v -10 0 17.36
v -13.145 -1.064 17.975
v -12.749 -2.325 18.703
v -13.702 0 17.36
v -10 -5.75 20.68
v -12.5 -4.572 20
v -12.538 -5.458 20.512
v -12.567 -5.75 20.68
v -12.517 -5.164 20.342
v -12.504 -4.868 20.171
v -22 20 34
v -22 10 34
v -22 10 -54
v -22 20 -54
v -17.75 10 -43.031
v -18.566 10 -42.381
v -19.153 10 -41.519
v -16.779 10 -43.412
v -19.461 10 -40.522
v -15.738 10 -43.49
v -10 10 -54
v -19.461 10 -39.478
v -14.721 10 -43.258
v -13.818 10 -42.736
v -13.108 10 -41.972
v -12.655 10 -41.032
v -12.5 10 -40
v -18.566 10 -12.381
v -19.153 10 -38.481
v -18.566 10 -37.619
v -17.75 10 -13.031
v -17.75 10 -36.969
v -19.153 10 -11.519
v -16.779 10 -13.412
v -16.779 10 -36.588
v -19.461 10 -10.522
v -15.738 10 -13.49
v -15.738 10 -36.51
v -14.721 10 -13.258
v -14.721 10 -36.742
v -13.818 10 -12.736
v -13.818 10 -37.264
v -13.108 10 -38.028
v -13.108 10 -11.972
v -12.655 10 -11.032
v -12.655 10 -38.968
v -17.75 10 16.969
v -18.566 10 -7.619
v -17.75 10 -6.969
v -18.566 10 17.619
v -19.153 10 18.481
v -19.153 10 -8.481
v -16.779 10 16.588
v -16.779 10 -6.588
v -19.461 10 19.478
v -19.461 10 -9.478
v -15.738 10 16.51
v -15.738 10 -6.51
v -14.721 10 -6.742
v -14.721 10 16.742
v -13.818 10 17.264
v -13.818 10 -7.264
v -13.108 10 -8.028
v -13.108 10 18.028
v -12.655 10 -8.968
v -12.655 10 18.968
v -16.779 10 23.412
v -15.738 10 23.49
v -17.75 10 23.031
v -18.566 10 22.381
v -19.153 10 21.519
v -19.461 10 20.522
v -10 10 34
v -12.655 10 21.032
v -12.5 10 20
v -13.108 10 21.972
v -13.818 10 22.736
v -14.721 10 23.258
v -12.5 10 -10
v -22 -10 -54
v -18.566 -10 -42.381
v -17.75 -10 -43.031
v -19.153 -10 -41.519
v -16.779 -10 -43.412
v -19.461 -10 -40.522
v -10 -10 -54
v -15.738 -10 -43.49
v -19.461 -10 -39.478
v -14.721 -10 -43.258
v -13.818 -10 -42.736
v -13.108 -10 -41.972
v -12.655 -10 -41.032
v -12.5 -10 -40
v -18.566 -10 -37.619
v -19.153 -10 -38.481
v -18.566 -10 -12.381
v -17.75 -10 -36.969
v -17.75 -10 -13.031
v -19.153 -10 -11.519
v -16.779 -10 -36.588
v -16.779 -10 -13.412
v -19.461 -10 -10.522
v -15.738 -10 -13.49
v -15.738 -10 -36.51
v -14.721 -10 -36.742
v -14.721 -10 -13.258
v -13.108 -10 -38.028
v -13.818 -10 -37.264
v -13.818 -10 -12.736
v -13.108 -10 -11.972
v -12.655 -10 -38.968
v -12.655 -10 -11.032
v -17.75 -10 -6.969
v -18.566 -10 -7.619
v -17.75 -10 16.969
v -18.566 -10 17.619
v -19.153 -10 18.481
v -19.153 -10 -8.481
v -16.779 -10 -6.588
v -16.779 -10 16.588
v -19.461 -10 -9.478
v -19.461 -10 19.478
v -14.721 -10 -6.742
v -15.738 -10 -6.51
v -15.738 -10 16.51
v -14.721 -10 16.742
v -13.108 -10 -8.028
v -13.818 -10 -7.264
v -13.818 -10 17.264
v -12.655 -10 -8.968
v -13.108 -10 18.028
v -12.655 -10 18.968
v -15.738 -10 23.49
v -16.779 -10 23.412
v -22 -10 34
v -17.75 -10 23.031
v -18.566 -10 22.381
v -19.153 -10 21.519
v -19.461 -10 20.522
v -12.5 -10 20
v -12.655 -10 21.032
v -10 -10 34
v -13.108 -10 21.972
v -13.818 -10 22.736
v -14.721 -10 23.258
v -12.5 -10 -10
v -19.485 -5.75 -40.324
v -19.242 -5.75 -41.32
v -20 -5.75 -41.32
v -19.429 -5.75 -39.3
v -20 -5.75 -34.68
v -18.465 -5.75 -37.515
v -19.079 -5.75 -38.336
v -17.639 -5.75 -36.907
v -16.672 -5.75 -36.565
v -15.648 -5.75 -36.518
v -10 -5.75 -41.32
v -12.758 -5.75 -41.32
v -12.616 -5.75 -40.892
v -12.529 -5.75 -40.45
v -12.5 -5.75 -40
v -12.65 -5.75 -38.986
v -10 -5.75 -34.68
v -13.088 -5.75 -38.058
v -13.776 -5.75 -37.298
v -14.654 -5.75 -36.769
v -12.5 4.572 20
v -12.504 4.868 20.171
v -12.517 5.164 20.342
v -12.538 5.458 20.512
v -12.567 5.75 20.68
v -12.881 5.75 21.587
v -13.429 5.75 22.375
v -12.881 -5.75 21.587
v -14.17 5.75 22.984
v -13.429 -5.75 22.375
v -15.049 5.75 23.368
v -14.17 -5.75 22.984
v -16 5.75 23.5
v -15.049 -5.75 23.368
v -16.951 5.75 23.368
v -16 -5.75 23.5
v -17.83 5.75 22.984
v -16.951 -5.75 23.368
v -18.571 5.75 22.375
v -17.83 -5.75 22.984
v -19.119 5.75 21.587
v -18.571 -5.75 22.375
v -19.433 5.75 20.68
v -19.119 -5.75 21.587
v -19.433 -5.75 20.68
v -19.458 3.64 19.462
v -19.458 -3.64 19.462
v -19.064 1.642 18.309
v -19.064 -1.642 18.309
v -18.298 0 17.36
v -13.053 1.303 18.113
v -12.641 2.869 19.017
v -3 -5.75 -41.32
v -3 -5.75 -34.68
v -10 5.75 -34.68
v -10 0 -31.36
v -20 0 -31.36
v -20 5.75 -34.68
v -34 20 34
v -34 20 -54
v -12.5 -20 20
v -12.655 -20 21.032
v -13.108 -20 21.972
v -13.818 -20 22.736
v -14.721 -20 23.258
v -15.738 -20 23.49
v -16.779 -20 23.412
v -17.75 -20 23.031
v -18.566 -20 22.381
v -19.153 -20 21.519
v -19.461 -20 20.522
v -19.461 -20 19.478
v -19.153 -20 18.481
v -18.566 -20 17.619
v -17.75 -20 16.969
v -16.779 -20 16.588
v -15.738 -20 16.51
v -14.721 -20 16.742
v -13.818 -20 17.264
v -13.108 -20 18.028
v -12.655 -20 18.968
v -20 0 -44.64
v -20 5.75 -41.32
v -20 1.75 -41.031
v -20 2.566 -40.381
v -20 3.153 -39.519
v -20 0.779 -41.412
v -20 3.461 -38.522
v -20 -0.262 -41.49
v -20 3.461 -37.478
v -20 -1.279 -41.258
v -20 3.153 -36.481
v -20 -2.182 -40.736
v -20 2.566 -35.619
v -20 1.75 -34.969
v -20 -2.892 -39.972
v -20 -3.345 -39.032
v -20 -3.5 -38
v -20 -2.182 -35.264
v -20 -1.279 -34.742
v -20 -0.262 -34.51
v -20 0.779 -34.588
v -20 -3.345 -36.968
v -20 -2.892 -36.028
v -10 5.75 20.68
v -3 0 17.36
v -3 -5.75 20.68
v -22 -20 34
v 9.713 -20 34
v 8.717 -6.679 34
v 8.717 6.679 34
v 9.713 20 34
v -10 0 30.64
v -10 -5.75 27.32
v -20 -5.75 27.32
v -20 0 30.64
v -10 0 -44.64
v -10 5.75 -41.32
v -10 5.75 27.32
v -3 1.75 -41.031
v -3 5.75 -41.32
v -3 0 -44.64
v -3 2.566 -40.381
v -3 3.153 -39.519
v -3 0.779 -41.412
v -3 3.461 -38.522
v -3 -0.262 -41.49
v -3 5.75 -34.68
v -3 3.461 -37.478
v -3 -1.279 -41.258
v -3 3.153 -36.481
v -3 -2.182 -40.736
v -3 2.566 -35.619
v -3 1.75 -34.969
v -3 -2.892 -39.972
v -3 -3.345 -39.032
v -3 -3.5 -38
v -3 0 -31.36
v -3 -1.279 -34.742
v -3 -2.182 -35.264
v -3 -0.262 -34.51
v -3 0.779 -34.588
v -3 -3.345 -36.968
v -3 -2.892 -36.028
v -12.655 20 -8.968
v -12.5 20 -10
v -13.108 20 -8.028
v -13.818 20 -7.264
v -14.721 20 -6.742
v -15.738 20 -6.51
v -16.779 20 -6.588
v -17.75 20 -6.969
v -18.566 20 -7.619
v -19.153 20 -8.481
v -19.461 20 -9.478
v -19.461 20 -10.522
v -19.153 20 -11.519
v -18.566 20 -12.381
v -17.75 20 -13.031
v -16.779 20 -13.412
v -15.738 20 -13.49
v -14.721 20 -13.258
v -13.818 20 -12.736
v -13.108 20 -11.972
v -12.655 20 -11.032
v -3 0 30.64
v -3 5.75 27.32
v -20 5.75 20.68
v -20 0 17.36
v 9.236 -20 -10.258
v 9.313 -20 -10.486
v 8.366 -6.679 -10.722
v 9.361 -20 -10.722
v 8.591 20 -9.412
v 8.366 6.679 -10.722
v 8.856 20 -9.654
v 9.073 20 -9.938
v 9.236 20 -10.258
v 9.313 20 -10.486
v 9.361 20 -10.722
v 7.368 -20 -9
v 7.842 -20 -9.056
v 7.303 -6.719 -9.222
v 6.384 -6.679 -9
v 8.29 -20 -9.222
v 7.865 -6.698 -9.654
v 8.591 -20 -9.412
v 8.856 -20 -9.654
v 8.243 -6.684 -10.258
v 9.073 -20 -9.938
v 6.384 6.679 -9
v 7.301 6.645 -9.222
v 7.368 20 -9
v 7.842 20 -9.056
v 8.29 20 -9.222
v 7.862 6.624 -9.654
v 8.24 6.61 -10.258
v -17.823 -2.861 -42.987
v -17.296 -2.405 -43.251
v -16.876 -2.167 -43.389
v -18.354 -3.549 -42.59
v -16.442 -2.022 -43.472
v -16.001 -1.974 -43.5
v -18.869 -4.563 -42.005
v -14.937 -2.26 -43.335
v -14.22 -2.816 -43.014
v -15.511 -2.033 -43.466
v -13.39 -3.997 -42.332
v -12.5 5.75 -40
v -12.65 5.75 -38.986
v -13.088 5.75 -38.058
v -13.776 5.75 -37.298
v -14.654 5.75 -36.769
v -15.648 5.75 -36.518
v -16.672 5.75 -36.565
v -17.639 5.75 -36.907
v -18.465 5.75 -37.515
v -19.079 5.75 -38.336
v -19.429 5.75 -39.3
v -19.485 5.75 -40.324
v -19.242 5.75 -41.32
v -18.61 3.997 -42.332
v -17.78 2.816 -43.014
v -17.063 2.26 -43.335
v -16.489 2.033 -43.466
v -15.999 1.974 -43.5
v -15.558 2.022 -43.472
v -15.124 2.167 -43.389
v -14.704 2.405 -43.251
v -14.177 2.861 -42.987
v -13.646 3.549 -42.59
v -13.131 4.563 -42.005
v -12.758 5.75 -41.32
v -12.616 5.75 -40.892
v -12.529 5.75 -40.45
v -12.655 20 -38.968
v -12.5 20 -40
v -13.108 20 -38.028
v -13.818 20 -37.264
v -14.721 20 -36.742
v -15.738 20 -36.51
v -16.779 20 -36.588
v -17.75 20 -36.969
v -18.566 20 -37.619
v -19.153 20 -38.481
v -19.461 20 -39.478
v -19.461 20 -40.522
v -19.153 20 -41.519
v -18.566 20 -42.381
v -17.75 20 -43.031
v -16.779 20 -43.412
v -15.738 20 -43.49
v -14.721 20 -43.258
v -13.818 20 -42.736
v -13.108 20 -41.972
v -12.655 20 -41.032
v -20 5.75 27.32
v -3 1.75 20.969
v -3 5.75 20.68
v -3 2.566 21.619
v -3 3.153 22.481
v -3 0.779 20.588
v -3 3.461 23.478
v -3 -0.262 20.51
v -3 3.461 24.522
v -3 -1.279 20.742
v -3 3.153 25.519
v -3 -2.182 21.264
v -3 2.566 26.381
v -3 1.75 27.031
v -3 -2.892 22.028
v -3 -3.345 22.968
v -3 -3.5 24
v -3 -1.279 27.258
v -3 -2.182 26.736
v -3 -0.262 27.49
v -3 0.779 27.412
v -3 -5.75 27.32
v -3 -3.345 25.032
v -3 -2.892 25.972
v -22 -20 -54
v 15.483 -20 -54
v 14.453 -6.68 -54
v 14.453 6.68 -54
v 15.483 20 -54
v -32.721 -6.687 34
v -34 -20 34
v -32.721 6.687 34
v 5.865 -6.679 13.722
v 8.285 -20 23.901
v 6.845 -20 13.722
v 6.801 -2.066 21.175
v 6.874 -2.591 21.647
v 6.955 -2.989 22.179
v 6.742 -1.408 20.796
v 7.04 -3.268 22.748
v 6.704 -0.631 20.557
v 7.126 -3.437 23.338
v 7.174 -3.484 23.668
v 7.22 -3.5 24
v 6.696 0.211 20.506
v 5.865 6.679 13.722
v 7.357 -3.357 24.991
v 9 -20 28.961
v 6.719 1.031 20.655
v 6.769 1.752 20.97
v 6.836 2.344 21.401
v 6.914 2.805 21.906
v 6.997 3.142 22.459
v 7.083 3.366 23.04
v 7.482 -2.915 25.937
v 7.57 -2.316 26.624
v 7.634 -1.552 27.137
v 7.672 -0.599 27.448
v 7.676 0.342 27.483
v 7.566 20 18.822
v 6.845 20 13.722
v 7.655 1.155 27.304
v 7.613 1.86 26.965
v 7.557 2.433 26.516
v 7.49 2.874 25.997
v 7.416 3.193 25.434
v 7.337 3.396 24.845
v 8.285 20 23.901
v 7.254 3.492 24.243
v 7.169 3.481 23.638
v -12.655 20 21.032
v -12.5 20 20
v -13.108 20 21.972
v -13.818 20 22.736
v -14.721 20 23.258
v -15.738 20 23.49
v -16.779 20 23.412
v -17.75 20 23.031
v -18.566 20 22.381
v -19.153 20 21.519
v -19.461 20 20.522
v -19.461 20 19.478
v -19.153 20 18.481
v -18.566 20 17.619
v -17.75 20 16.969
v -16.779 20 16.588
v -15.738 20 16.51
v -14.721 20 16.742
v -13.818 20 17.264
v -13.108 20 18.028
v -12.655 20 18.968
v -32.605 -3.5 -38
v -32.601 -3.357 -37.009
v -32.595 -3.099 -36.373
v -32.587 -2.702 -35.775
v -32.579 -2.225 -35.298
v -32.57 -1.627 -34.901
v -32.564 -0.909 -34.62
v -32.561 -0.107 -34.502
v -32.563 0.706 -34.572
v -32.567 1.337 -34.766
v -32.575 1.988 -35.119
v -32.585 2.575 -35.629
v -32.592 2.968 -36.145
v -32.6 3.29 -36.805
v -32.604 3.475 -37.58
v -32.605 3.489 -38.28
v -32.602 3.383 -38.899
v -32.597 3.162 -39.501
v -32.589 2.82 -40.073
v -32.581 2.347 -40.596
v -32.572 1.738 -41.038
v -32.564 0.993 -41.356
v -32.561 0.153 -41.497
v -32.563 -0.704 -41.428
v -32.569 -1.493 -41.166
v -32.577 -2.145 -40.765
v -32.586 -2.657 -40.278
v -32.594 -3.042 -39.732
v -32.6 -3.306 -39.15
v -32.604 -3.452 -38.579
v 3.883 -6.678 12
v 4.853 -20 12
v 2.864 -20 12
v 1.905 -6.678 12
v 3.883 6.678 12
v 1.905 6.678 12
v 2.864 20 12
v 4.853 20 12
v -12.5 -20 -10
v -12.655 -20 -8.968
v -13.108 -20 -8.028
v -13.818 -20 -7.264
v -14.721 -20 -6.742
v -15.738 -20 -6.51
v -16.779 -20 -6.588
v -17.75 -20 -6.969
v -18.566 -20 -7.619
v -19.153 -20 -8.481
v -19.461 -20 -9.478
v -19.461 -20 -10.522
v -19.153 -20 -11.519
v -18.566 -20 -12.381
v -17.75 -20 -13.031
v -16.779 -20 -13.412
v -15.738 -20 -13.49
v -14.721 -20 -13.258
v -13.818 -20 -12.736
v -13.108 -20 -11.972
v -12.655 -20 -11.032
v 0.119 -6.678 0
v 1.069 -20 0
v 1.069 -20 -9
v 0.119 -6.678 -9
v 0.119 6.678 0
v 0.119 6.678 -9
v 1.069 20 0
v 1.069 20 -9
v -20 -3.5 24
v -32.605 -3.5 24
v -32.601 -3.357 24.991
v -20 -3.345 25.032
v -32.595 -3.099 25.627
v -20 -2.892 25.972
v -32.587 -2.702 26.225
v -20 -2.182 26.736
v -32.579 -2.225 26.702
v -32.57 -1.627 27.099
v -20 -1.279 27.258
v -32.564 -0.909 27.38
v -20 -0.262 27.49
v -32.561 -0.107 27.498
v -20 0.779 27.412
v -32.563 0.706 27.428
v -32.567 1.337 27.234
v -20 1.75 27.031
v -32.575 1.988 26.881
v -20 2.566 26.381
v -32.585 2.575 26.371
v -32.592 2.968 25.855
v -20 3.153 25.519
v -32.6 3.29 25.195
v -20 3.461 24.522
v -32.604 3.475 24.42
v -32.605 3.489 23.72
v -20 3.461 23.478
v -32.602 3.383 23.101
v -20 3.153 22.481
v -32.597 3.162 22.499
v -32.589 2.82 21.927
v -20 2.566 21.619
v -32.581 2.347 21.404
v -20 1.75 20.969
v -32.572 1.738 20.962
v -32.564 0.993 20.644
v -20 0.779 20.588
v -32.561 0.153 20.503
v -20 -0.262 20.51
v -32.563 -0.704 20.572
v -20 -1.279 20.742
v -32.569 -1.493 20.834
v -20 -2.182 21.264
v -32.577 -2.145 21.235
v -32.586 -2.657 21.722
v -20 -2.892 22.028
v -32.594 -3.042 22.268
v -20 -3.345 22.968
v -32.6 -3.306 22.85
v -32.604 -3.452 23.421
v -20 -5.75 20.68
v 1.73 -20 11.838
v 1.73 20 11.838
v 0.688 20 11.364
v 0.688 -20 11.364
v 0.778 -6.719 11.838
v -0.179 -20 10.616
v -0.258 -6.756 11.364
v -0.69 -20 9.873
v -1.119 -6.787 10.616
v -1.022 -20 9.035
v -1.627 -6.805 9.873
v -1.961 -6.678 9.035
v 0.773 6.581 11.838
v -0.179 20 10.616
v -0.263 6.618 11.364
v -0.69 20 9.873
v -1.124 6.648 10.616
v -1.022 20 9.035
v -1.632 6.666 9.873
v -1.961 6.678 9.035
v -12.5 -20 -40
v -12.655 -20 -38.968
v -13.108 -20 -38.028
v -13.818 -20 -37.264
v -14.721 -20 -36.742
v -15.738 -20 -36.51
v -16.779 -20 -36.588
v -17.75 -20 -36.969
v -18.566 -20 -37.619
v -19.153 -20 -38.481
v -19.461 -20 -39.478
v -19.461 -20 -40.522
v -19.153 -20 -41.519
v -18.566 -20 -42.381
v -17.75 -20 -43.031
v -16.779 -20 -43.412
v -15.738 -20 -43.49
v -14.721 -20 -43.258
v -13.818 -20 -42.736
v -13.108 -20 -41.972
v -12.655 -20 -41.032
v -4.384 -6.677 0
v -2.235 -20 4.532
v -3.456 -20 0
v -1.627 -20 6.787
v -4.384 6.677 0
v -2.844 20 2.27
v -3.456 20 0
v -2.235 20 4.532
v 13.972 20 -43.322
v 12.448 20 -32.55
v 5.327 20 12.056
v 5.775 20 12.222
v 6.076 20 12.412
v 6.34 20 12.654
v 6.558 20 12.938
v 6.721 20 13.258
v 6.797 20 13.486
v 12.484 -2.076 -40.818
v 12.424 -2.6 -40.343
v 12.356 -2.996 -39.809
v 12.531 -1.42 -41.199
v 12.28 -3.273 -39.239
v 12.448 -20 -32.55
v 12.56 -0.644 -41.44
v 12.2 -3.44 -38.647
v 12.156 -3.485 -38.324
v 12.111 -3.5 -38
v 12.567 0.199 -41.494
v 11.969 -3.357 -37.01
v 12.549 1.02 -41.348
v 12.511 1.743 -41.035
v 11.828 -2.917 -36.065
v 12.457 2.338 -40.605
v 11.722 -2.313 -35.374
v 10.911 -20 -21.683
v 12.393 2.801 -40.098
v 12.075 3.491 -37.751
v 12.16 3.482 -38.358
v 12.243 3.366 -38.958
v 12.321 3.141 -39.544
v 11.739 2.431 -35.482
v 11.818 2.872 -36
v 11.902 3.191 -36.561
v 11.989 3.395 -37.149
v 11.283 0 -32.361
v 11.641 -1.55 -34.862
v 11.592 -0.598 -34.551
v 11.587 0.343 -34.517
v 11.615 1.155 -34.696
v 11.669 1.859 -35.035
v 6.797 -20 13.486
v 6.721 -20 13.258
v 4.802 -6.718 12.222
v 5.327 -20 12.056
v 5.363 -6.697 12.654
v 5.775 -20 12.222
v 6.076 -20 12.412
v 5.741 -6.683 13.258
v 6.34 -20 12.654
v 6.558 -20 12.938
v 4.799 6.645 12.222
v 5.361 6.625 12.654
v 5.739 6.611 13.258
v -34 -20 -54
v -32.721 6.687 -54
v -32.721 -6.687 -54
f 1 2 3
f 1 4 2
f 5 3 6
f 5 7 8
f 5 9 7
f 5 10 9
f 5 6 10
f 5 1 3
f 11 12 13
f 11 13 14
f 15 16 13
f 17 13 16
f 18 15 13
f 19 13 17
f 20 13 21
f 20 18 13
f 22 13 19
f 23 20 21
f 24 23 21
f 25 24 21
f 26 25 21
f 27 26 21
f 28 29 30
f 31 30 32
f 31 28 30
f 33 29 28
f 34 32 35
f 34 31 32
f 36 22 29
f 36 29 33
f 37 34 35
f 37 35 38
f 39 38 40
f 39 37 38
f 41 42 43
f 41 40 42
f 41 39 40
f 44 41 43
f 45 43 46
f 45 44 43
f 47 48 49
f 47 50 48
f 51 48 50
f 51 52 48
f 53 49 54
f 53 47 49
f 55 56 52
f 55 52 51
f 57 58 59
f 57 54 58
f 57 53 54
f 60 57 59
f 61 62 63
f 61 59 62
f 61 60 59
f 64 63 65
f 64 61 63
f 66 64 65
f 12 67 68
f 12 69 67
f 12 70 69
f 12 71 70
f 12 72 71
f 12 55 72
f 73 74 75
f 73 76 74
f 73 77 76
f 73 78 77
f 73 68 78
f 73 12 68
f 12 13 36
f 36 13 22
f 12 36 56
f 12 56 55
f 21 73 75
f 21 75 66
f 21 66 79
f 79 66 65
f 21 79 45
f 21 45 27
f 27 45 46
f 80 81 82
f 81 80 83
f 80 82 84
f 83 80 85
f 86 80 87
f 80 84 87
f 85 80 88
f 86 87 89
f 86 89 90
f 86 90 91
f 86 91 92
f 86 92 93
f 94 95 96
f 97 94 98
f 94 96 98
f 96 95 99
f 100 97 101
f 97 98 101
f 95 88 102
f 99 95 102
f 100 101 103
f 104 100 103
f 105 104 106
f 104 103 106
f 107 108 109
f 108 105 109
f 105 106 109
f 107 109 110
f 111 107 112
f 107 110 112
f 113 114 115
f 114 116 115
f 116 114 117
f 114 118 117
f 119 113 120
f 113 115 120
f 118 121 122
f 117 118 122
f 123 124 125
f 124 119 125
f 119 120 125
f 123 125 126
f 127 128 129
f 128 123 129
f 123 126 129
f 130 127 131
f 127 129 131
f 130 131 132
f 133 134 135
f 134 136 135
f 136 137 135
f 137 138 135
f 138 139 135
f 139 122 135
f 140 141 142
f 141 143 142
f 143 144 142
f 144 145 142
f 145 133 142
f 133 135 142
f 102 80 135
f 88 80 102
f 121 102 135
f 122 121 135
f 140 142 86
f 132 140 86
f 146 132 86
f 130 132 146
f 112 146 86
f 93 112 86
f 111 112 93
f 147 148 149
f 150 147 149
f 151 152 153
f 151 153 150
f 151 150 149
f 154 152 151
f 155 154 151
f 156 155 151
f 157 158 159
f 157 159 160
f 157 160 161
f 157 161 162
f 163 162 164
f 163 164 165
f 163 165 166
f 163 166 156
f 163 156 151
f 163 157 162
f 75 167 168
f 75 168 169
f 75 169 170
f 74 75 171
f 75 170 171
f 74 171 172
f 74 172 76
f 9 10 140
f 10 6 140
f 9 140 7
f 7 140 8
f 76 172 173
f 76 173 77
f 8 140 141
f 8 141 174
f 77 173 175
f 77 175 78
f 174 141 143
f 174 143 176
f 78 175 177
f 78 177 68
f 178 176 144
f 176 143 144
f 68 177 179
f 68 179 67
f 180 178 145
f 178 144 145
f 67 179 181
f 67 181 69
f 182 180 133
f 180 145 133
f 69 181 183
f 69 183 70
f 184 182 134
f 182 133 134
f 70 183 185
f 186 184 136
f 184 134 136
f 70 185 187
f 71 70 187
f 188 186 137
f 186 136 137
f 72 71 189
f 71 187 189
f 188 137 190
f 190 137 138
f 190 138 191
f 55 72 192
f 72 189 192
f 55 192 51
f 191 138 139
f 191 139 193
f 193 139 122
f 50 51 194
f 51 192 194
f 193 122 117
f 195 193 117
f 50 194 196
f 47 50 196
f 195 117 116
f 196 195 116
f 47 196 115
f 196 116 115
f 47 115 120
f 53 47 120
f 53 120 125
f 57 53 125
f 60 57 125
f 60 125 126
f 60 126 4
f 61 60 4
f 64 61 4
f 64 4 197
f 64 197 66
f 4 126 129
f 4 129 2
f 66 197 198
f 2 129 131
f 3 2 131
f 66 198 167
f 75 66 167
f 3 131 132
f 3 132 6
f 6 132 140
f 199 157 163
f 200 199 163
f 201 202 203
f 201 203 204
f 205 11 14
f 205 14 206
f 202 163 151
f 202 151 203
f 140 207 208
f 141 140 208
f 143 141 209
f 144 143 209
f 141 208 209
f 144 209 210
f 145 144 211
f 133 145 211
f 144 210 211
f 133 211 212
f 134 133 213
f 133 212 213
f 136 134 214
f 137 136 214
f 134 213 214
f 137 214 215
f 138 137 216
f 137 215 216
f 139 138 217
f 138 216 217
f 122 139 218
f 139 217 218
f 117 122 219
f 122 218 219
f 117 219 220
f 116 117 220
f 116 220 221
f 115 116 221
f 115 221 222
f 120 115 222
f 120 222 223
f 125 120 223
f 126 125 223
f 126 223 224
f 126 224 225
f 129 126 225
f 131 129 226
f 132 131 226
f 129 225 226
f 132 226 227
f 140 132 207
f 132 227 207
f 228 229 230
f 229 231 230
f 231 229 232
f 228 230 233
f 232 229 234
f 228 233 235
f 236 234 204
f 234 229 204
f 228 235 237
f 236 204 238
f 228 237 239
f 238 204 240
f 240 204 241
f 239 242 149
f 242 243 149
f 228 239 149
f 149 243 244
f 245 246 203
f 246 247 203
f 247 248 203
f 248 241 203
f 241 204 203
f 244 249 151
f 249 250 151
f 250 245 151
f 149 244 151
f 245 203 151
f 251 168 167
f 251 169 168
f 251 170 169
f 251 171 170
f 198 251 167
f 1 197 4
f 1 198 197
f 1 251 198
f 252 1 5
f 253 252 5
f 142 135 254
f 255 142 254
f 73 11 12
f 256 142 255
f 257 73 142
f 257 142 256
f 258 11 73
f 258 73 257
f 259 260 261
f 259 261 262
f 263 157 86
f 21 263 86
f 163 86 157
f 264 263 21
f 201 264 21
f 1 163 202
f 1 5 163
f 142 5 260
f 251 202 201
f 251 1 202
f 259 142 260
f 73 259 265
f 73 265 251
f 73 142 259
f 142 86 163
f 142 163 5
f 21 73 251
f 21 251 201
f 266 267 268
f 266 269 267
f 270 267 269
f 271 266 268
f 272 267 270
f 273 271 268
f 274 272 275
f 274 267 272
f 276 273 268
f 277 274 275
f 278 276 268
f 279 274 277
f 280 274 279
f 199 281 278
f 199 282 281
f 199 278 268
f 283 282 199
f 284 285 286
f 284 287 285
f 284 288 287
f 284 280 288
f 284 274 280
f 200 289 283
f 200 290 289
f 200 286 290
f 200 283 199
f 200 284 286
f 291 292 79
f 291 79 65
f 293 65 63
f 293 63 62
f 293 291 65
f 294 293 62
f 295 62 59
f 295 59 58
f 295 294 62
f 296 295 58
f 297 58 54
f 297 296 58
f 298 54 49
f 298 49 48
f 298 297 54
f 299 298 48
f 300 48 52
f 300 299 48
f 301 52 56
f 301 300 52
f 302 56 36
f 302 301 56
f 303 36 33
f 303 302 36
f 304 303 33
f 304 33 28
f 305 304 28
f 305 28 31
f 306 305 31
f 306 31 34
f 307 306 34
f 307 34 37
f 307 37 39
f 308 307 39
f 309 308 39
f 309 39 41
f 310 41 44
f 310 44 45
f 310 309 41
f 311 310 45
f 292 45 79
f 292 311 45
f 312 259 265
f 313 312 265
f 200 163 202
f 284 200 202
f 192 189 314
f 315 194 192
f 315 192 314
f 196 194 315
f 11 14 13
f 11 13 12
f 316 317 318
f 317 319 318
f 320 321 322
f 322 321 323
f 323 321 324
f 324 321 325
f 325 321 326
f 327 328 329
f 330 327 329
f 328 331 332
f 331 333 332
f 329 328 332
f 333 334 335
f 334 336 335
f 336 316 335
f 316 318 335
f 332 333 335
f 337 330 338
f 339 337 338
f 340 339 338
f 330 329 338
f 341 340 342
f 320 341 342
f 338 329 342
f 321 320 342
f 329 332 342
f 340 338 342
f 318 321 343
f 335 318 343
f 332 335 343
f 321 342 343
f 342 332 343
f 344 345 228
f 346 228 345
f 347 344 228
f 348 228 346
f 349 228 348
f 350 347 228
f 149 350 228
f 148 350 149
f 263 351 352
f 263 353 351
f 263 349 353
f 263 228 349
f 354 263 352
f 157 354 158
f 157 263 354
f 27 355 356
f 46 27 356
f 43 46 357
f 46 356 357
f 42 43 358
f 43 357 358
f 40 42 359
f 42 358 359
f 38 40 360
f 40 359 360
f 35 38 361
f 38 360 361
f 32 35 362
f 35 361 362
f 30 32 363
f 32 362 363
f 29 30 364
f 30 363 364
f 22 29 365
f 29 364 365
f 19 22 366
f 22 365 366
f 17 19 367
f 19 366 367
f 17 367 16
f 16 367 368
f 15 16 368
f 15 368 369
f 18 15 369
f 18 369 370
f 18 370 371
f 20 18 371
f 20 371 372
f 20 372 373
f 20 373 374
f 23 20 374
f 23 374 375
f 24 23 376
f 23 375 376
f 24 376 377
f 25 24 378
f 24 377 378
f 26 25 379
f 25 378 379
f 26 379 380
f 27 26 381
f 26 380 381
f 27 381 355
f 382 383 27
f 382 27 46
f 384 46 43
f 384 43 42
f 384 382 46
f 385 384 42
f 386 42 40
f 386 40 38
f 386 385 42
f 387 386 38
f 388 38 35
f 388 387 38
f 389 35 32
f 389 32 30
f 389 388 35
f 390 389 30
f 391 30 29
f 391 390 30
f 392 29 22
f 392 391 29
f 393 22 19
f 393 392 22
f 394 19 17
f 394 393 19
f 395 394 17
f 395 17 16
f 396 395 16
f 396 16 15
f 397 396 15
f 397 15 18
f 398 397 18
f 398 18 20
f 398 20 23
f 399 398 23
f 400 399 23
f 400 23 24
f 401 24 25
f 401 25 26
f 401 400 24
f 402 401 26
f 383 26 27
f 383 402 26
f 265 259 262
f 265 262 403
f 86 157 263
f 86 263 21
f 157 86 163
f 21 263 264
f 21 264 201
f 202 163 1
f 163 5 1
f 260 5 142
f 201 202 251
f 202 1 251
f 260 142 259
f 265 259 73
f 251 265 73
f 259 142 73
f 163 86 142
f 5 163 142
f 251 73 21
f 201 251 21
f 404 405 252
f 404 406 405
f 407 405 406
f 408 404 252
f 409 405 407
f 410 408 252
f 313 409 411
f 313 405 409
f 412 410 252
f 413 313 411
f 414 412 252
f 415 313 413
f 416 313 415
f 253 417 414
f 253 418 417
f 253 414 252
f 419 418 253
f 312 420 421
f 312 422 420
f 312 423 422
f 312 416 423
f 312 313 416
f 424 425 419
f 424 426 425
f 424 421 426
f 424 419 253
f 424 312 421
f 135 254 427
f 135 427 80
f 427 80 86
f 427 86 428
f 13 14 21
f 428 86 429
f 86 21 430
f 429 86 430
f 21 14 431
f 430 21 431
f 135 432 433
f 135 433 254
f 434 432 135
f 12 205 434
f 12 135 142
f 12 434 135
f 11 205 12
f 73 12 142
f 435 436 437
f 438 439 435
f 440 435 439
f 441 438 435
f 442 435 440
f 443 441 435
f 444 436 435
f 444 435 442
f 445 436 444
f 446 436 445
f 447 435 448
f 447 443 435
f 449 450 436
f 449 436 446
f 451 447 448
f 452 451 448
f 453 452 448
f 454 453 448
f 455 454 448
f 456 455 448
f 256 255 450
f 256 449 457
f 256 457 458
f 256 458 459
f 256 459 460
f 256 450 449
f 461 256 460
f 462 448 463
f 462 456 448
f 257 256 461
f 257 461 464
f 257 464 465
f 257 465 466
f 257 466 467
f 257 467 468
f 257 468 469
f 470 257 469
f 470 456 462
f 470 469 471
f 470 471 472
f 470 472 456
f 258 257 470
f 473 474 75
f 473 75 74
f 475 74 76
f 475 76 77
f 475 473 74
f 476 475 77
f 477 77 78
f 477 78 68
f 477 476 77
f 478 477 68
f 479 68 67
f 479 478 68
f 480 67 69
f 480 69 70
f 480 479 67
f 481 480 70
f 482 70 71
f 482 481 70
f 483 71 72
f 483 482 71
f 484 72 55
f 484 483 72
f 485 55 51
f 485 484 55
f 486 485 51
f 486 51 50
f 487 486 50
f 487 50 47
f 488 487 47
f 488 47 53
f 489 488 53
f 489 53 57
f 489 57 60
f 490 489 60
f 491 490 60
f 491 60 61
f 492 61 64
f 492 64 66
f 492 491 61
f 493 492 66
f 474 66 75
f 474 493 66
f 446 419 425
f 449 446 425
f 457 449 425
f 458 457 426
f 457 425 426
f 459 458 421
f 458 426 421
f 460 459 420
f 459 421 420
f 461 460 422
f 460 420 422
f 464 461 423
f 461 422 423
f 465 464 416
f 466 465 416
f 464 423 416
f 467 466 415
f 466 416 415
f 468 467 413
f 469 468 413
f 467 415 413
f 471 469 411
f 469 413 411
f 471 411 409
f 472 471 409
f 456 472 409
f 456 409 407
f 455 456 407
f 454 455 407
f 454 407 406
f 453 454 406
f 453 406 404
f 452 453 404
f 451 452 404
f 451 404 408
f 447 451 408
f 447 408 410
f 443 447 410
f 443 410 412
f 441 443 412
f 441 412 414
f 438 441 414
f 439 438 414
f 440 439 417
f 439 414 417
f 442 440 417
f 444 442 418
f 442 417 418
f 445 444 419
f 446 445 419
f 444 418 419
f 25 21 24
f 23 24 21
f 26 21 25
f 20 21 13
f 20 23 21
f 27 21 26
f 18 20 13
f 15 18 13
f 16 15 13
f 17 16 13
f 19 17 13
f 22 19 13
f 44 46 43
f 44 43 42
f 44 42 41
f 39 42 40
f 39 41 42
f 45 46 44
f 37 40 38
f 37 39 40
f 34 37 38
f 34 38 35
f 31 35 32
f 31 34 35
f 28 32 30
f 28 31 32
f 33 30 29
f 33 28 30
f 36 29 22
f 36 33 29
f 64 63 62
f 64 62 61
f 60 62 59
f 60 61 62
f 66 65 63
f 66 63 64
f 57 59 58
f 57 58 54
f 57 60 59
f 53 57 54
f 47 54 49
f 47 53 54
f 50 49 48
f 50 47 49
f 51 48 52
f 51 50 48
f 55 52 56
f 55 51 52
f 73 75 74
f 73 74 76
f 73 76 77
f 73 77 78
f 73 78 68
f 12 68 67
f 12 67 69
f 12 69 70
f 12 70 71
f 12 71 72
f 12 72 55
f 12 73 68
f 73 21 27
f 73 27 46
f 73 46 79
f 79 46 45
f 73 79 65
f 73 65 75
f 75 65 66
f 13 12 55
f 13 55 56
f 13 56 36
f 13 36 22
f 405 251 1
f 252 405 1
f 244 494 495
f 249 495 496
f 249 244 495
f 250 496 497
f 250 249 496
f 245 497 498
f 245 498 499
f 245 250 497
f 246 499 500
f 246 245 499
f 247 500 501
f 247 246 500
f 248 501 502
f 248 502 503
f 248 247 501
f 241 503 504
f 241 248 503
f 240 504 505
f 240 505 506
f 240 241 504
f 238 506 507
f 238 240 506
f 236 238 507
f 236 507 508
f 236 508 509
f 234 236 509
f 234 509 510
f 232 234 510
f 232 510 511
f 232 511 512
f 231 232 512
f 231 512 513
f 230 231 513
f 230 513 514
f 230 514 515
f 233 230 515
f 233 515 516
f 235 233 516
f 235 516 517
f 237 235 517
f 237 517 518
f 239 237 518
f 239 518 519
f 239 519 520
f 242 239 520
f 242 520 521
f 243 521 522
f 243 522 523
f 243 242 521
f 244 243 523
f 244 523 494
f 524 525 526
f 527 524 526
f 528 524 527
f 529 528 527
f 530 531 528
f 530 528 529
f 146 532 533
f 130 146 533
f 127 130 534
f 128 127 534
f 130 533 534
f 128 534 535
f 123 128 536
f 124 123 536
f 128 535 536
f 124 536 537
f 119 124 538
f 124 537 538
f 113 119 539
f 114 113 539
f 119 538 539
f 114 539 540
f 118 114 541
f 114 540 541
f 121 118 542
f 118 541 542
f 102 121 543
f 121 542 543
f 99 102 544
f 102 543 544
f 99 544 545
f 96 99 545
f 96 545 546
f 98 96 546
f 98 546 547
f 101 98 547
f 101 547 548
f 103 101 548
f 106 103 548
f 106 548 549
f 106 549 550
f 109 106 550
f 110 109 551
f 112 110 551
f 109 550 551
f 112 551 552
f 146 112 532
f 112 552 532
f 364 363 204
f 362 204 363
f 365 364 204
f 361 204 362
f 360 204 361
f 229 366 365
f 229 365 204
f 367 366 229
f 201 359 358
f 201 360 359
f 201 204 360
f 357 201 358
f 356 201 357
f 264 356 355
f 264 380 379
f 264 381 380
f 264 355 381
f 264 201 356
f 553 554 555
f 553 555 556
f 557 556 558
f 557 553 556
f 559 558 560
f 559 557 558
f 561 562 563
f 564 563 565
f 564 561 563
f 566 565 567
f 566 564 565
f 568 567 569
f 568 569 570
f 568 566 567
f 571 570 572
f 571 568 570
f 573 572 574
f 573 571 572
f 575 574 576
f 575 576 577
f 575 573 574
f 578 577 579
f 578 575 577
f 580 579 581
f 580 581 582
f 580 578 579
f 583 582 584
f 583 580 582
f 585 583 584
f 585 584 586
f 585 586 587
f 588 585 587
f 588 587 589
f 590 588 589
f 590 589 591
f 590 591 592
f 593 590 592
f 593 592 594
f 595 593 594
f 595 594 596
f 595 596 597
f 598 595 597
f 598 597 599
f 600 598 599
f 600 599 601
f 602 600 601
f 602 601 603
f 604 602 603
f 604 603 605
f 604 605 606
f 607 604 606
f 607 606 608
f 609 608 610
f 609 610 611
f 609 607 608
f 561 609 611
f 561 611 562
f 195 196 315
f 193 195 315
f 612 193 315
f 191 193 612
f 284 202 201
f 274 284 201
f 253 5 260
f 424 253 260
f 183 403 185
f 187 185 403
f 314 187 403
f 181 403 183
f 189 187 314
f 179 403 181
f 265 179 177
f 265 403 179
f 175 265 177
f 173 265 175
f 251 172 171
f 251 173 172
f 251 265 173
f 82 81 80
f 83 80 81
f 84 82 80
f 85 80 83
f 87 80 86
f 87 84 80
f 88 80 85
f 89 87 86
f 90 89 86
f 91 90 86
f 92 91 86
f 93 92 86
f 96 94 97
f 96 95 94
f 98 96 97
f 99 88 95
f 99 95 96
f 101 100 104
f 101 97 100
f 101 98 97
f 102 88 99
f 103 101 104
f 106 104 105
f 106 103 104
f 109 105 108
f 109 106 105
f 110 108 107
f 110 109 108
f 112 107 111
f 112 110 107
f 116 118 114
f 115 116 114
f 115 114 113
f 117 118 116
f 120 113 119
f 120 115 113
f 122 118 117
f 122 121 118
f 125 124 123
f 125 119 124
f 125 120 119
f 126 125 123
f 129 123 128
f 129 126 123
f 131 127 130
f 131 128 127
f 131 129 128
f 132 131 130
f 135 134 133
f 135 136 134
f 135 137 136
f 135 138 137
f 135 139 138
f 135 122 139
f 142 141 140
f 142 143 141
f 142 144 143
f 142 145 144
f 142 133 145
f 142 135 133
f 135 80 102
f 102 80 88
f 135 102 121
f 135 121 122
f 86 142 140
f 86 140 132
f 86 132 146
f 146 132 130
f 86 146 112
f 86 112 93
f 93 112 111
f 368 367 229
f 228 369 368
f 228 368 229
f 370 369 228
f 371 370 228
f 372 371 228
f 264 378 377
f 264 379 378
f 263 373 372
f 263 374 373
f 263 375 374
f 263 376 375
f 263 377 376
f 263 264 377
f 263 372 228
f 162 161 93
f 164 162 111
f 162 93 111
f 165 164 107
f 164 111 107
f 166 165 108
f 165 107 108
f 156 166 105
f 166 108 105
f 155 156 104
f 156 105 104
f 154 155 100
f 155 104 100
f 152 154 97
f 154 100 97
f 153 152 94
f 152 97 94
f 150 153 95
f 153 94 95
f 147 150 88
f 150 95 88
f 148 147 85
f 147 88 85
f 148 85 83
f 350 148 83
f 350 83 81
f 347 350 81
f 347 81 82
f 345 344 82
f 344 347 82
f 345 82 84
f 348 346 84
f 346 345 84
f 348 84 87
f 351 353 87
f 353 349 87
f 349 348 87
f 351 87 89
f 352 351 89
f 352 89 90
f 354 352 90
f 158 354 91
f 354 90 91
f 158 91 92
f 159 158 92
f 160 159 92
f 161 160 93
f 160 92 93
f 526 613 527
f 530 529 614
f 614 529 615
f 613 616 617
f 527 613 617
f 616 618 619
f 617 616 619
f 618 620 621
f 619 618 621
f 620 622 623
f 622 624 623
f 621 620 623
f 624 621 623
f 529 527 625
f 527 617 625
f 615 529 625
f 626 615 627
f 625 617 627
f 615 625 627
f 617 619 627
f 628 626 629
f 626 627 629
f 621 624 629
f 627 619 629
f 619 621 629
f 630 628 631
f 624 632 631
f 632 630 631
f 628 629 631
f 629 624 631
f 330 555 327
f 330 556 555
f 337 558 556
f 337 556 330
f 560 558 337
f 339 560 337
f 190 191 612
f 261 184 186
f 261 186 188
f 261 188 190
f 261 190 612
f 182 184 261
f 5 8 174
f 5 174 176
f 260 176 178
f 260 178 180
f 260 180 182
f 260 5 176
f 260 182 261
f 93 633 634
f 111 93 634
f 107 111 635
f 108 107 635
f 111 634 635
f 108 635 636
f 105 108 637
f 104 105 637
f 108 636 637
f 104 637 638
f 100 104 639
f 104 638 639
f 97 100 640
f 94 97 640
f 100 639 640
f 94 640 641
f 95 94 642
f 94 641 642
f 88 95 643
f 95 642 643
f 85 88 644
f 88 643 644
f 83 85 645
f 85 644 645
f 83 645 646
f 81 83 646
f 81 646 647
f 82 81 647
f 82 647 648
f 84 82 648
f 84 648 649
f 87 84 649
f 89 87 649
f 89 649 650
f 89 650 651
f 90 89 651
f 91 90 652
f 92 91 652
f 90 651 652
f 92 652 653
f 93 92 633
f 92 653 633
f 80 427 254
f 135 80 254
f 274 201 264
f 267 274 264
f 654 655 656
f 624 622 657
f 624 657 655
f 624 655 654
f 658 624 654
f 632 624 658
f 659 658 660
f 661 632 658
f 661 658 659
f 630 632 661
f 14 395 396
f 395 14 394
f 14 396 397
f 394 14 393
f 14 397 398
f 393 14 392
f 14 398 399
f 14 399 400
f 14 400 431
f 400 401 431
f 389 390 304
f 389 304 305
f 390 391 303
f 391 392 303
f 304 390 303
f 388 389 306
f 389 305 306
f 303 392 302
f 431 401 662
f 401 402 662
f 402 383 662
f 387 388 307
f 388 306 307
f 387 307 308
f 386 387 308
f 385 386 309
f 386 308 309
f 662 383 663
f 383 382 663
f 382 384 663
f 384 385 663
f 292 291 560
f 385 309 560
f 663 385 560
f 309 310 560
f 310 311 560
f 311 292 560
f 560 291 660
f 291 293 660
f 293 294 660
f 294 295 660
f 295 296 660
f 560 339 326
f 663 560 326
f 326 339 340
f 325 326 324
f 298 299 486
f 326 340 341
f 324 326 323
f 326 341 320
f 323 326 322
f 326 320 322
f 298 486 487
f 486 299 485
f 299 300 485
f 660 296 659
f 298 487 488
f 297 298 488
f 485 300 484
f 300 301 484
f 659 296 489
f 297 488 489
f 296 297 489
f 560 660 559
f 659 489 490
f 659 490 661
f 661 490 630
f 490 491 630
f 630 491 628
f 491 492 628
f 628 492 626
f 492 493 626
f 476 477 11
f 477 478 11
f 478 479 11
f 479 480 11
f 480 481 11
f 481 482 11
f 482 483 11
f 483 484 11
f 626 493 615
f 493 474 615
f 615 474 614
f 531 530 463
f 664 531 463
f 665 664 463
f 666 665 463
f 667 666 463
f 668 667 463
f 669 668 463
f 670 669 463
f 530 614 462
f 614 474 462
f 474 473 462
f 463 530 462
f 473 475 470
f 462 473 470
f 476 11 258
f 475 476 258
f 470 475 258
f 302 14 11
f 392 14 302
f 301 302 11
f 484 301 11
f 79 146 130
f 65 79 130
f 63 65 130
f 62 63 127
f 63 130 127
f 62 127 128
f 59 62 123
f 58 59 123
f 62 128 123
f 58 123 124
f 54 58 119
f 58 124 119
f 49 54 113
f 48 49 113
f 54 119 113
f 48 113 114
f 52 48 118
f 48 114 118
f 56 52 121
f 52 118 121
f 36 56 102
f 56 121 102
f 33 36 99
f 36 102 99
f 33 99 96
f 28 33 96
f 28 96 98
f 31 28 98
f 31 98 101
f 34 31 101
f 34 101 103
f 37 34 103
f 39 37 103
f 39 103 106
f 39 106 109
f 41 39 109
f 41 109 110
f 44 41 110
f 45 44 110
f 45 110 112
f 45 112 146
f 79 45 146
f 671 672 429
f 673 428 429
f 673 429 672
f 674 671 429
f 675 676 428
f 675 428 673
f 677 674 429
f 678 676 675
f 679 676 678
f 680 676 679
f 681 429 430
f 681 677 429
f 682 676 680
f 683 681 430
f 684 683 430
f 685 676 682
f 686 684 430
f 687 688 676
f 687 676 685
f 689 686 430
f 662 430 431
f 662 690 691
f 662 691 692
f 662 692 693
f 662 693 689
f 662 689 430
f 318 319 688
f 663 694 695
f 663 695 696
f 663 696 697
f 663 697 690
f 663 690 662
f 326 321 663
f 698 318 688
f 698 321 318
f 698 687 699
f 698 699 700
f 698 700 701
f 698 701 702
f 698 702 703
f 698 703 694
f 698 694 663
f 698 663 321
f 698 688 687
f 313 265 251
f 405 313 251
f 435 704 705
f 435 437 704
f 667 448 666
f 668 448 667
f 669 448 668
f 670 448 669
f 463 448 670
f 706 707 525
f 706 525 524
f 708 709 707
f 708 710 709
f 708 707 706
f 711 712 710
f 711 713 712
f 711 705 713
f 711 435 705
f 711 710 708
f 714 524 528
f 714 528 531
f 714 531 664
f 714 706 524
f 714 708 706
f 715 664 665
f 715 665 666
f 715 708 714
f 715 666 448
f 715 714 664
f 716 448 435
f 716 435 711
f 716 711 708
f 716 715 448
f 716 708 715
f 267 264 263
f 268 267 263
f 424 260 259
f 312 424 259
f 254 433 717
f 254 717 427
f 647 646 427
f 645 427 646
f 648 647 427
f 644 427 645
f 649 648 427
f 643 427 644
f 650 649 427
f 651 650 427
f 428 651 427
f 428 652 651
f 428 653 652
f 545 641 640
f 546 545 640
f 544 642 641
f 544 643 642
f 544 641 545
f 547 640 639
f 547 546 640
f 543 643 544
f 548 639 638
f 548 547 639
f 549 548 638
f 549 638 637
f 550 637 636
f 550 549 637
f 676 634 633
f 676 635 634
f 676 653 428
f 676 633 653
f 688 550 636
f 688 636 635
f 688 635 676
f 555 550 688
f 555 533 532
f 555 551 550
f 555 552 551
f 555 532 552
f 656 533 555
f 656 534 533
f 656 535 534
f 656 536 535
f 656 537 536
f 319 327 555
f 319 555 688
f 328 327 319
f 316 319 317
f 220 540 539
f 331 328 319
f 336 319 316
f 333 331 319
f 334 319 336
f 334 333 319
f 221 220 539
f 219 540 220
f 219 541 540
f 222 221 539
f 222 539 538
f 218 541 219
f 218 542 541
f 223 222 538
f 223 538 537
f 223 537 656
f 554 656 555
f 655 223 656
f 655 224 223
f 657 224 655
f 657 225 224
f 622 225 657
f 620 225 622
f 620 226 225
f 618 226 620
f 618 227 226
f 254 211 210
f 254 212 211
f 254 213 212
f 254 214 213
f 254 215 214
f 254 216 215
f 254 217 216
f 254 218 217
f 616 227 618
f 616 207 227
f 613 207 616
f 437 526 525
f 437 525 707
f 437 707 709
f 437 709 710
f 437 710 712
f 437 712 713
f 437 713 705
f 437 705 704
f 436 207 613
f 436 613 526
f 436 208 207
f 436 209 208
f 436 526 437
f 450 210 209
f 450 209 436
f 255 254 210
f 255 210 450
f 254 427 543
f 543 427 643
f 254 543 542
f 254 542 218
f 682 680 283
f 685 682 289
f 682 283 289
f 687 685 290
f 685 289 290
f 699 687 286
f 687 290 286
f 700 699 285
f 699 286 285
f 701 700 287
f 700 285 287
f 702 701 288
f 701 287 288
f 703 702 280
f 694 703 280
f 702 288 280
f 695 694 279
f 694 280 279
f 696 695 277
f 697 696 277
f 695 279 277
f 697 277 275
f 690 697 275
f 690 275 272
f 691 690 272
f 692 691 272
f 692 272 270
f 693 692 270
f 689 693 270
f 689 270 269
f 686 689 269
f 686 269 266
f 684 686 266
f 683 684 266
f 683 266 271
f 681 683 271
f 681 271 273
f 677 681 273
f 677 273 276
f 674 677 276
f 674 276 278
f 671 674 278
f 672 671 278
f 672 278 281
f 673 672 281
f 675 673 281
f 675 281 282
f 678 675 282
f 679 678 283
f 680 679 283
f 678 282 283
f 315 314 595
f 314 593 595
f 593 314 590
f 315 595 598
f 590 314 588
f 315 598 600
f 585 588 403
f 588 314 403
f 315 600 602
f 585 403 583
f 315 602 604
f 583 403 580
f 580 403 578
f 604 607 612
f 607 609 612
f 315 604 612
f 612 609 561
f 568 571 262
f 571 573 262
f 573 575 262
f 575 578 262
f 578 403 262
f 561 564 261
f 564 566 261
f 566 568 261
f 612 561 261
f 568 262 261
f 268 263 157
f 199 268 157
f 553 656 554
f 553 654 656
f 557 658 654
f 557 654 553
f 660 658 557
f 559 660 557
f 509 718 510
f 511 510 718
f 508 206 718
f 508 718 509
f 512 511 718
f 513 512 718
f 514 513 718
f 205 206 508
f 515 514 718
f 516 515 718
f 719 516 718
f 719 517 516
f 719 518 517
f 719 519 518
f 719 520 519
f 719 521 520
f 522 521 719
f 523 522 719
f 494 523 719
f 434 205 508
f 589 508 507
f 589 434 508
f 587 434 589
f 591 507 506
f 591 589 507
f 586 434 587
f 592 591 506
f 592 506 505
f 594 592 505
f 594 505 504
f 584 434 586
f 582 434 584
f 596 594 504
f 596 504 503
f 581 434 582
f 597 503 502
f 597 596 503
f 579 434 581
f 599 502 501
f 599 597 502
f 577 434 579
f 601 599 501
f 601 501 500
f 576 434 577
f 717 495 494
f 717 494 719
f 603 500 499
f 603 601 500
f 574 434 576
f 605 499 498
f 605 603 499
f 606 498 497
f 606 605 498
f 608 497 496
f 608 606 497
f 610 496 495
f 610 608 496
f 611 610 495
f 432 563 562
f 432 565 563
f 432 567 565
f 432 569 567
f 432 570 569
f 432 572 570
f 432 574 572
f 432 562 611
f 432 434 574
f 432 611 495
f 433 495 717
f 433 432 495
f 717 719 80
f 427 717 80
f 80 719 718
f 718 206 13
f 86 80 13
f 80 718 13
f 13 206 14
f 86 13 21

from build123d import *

# Parameters (mm, degrees)
F1_ANGLE_BACK = 15
F1_ANGLE      = 30
F3_DEPTH      = 88.001
F4_R          = 4
F5_R          = 2
F6_R          = 3.5
F7_DEPTH      = 7
F8_DEPTH      = 25.4835061419
F9_W          = 12
F9_H          = 88
F9_R          = 3.5
F10_DEPTH     = 10
F14_DEPTH     = 88
F15_DEPTH     = 40.0010001
F16_DEPTH     = 24.001
F17_DEPTH     = 10


with BuildPart() as f1:
    # F0 (on Front) → F1 (revolve)
    with BuildSketch(Plane.XZ, mode=Mode.PRIVATE) as f1_sk:
        Polygon((5.5, 12), (8.5918983635, 34), (-15, 34), (-15, -54), (14.3243375616, -54), (8, -9), (0, -9), (0, 0), (-4.5, 0), (-1.2846096908, 12), align=None)
    revolve(f1_sk.sketch.rotate(Axis((187.5898689032, 0, -10), (0, 0, -1)), -F1_ANGLE_BACK), axis=Axis((187.5898689032, 0, -10), (0, 0, -1)), revolution_arc=F1_ANGLE)

    # F2 (on face) → F3 (cut, through all)
    with BuildSketch(Plane.XY.offset(34)):
        Polygon((-30, -20), (-30, -120), (30, -120), (30, -20), (-10, -20), (-10, 20), (30, 20), (30, 120), (-30, 120), (-30, 20), align=None)
    extrude(amount=-F3_DEPTH, mode=Mode.SUBTRACT)

    # F4
    f4_edges = [f1.edges().sort_by_distance(p)[0] for p in [
        (-1.28461, 0, 12),
    ]]
    fillet(f4_edges, radius=F4_R)

    # F5
    f5_edges = [f1.edges().sort_by_distance(p)[0] for p in [
        (5.5, 0, 12),
        (8, 0, -9),
    ]]
    fillet(f5_edges, radius=F5_R)

    # F6 (on face) → F7 (cut)
    with BuildSketch(Plane(origin=(-10, 0, 0), x_dir=(0, -1, 0), z_dir=(-1, 0, 0))):
        Polygon((5.75, 27.3197640478), (0, 30.6395280957), (-5.75, 27.3197640478), (-5.75, 20.6802359522), (0, 17.3604719043), (5.75, 20.6802359522), align=None)
        with Locations((0, 24)):
            Circle(F6_R, mode=Mode.SUBTRACT)
        Polygon((5.75, -34.6802359522), (0, -31.3604719043), (-5.75, -34.6802359522), (-5.75, -41.3197640478), (0, -44.6395280957), (5.75, -41.3197640478), align=None)
        with Locations((0, -38)):
            Circle(F6_R, mode=Mode.SUBTRACT)
        with Locations((0, 24)):
            Circle(F6_R)
        with Locations((0, -38)):
            Circle(F6_R)
    extrude(amount=-F7_DEPTH, mode=Mode.SUBTRACT)

    # F6 (on face) → F8 (cut, through all)
    with BuildSketch(Plane(origin=(-10, 0, 0), x_dir=(0, -1, 0), z_dir=(-1, 0, 0))):
        with Locations((0, 24)):
            Circle(F6_R)
        with Locations((0, -38)):
            Circle(F6_R)
    extrude(amount=-F8_DEPTH, mode=Mode.SUBTRACT)


with BuildPart() as f10:
    # F9 (on face) → F10 (new body)
    with BuildSketch(Plane.XZ.offset(20)):
        with Locations((-16, -10)):
            Rectangle(F9_W, F9_H)
        with Locations((-16, -40)):
            Circle(F9_R, mode=Mode.SUBTRACT)
        with Locations((-16, -10)):
            Circle(F9_R, mode=Mode.SUBTRACT)
        with Locations((-16, 20)):
            Circle(F9_R, mode=Mode.SUBTRACT)
    extrude(amount=-F10_DEPTH)


with BuildPart() as f11_1:
    # F11: instance of F10
    add(f10.part.mirror(Plane.XZ))


with BuildPart() as f1_1:
    add(f1.part)

    # F12: union F10, F11_1
    add(f10.part)
    add(f11_1.part)


with BuildPart() as f14:
    # F13 (on face) → F14 (new body, through all)
    with BuildSketch(Plane.XY.offset(34)):
        with BuildLine():
            Line((-10, 10), (-22, 10))
            Line((-22, 10), (-22, 20))
            Line((-22, 20), (-34, 20))
            ThreePointArc((-34, 20), (-32.5609489335, 0), (-34, -20))
            Line((-34, -20), (-22, -20))
            Line((-22, -20), (-22, -10))
            Line((-22, -10), (-10, -10))
            Line((-10, -10), (-10, 10))
        make_face()
    extrude(amount=-F14_DEPTH)

    # F9 (on face) → F15 (cut, through all)
    with BuildSketch(Plane.XZ.offset(20)):
        with Locations((-16, 20)):
            Circle(F9_R)
        with Locations((-16, -10)):
            Circle(F9_R)
        with Locations((-16, -40)):
            Circle(F9_R)
    extrude(amount=-F15_DEPTH, mode=Mode.SUBTRACT)

    # F6 (on face) → F16 (cut, through all)
    with BuildSketch(Plane(origin=(-10, 0, 0), x_dir=(0, -1, 0), z_dir=(-1, 0, 0))):
        with Locations((0, -38)):
            Circle(F6_R)
        with Locations((0, 24)):
            Circle(F6_R)
    extrude(amount=F16_DEPTH, mode=Mode.SUBTRACT)

    # F6 (on face) → F17 (cut)
    with BuildSketch(Plane(origin=(-10, 0, 0), x_dir=(0, -1, 0), z_dir=(-1, 0, 0))):
        Polygon((5.75, -34.6802359522), (0, -31.3604719043), (-5.75, -34.6802359522), (-5.75, -41.3197640478), (0, -44.6395280957), (5.75, -41.3197640478), align=None)
        with Locations((0, -38)):
            Circle(F6_R, mode=Mode.SUBTRACT)
        Polygon((5.75, 27.3197640478), (0, 30.6395280957), (-5.75, 27.3197640478), (-5.75, 20.6802359522), (0, 17.3604719043), (5.75, 20.6802359522), align=None)
        with Locations((0, 24)):
            Circle(F6_R, mode=Mode.SUBTRACT)
    extrude(amount=F17_DEPTH, mode=Mode.SUBTRACT)


solid = Compound([f1_1.part, f14.part])
